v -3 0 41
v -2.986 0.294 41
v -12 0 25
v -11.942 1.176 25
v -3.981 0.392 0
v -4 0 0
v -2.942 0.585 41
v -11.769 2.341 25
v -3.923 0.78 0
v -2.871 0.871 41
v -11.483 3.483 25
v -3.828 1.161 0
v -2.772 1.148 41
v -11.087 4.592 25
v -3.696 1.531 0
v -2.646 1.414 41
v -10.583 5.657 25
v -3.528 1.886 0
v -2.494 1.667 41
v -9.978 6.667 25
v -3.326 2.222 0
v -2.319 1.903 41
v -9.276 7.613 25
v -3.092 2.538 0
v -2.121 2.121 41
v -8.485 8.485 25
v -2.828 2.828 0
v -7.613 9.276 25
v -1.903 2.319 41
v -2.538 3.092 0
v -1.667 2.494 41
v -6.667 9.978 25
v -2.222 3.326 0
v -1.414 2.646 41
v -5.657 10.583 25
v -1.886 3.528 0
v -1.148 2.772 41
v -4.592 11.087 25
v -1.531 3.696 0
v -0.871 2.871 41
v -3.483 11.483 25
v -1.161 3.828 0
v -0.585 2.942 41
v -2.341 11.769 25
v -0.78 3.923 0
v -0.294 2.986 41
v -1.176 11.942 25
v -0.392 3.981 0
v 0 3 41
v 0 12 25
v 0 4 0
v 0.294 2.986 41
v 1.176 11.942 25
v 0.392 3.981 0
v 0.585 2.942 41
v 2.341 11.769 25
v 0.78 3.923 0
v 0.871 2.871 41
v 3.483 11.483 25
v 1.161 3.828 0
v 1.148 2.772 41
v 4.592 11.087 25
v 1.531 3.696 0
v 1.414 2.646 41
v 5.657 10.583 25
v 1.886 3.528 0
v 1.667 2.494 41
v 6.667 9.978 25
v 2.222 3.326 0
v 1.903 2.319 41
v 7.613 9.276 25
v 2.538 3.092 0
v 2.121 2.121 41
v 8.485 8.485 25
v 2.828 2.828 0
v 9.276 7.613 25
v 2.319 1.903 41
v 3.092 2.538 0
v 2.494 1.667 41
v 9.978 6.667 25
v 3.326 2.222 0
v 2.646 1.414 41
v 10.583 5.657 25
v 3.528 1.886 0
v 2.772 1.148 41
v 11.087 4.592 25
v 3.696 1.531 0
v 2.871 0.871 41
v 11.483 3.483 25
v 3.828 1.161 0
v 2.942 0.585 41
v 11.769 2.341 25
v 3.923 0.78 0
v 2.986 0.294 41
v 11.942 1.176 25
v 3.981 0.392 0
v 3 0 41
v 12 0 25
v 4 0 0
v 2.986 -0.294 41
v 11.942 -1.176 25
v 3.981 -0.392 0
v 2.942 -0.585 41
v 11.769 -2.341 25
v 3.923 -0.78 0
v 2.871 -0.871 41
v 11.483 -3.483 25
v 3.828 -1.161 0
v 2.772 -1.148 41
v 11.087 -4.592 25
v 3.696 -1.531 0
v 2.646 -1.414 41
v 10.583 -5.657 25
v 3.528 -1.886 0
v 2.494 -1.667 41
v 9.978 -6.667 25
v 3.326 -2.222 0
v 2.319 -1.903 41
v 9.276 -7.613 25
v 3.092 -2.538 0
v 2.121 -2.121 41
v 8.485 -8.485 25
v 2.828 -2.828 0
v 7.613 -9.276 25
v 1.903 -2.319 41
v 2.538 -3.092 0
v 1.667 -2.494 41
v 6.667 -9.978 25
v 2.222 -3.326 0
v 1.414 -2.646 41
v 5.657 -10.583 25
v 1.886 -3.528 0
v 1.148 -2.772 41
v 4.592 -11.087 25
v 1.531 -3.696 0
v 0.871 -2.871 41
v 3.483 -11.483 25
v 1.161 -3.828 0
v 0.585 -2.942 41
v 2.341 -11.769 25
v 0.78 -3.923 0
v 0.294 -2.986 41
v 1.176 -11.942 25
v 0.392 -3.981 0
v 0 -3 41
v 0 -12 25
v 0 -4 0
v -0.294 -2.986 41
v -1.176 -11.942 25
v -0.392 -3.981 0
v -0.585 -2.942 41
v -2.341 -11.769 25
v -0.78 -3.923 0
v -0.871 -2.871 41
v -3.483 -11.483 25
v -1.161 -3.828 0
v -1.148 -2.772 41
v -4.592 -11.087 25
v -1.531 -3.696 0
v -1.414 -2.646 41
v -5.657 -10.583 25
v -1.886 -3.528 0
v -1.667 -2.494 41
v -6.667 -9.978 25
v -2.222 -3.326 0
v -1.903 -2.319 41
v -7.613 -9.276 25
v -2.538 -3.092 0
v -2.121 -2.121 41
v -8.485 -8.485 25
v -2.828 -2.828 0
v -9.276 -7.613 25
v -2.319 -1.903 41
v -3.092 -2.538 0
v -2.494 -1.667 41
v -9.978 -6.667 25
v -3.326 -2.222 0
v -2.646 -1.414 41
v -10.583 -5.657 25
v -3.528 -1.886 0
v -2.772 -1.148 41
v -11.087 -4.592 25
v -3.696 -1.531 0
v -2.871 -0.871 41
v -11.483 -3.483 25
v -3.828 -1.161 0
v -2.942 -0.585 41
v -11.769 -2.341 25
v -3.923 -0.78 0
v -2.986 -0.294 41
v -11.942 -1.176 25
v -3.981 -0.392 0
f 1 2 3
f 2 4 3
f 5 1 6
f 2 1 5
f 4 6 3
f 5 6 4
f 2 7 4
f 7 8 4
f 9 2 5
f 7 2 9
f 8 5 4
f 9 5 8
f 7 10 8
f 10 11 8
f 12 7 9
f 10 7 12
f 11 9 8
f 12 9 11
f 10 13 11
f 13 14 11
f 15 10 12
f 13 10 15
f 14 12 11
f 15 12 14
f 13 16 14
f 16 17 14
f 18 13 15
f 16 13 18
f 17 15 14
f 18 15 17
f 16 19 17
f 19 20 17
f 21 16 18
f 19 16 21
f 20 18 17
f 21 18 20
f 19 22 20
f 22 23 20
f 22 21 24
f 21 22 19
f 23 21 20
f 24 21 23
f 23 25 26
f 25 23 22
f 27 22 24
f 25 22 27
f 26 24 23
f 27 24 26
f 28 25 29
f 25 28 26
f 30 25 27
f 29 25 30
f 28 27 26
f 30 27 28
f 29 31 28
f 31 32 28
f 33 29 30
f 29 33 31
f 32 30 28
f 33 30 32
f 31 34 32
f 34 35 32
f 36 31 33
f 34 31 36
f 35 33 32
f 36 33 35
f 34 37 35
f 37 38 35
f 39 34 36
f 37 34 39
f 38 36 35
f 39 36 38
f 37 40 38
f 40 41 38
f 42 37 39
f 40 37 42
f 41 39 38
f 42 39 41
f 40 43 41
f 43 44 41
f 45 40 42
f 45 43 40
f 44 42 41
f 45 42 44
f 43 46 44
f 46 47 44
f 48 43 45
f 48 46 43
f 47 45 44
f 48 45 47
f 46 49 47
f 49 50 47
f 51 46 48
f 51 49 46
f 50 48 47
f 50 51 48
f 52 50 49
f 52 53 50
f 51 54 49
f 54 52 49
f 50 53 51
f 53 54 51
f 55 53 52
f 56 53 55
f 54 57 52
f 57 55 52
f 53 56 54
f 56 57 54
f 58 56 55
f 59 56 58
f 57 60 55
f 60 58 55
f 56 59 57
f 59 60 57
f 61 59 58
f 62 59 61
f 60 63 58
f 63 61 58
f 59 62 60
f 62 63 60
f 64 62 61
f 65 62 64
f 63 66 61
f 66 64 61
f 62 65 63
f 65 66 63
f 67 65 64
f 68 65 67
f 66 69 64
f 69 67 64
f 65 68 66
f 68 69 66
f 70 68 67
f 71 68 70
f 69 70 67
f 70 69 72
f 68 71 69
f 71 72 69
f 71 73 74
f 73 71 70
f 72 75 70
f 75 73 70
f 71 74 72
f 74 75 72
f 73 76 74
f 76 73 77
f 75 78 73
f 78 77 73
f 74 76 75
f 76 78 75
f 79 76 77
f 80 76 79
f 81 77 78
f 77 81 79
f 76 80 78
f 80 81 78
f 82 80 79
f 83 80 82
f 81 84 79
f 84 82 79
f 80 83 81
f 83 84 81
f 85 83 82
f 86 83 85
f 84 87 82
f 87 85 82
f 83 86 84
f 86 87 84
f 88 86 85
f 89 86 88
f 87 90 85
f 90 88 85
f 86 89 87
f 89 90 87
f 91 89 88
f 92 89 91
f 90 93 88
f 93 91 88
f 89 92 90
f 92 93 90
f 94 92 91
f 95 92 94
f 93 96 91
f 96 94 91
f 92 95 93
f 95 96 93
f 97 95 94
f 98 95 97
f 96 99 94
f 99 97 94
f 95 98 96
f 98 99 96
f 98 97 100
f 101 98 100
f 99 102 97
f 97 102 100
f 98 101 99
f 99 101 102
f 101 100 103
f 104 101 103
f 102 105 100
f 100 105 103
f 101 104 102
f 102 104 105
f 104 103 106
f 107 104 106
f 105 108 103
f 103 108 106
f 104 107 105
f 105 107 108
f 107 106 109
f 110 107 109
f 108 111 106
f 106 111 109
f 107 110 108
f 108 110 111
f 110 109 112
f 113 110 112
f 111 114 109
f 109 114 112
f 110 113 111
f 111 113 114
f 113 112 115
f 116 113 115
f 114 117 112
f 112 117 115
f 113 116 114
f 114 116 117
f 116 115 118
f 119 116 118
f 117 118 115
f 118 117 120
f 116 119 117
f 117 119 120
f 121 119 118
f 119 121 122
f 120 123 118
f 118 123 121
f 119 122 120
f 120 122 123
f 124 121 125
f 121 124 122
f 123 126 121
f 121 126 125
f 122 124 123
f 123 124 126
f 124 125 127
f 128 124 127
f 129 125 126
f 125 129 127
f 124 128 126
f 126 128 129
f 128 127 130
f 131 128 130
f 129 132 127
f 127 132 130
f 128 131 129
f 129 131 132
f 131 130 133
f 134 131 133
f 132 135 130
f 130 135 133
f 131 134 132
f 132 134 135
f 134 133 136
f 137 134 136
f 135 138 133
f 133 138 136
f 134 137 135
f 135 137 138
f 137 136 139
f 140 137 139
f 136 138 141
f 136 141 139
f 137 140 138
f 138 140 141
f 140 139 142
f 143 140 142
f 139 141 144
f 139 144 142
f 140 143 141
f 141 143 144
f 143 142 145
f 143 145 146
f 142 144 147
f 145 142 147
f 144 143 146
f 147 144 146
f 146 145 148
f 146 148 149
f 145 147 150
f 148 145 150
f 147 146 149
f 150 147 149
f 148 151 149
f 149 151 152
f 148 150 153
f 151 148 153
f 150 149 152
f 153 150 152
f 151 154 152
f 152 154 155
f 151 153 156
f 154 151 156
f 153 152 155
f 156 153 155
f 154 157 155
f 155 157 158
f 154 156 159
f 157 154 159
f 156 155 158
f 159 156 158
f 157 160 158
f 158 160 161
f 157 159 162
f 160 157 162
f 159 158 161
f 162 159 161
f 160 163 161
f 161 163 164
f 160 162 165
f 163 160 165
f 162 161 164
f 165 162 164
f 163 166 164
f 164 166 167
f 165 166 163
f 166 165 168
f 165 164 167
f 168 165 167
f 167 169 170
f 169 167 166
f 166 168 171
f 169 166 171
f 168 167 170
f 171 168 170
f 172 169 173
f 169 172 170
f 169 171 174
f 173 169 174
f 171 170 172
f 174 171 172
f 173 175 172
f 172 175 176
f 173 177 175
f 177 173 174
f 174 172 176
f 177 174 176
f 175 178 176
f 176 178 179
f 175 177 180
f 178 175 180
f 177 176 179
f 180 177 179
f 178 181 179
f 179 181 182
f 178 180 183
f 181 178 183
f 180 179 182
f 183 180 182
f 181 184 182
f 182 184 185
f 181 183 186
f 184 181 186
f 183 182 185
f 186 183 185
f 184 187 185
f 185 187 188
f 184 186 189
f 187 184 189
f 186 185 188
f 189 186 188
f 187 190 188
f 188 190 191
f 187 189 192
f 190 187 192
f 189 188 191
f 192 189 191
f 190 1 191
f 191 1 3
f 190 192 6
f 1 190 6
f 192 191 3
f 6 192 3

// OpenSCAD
// Built by bench/smallmodels/features/compiler.py from a list of features.
$fn = 64;
difference() {
  union() {
    translate([0, 0, 0]) rotate_extrude() polygon([[4, 0], [12, 25], [3, 41]]);
  }
  union() {
    translate([0, 0, -1]) rotate([0, 0, 0]) cylinder(d = 3, h = 43);
  }
}
